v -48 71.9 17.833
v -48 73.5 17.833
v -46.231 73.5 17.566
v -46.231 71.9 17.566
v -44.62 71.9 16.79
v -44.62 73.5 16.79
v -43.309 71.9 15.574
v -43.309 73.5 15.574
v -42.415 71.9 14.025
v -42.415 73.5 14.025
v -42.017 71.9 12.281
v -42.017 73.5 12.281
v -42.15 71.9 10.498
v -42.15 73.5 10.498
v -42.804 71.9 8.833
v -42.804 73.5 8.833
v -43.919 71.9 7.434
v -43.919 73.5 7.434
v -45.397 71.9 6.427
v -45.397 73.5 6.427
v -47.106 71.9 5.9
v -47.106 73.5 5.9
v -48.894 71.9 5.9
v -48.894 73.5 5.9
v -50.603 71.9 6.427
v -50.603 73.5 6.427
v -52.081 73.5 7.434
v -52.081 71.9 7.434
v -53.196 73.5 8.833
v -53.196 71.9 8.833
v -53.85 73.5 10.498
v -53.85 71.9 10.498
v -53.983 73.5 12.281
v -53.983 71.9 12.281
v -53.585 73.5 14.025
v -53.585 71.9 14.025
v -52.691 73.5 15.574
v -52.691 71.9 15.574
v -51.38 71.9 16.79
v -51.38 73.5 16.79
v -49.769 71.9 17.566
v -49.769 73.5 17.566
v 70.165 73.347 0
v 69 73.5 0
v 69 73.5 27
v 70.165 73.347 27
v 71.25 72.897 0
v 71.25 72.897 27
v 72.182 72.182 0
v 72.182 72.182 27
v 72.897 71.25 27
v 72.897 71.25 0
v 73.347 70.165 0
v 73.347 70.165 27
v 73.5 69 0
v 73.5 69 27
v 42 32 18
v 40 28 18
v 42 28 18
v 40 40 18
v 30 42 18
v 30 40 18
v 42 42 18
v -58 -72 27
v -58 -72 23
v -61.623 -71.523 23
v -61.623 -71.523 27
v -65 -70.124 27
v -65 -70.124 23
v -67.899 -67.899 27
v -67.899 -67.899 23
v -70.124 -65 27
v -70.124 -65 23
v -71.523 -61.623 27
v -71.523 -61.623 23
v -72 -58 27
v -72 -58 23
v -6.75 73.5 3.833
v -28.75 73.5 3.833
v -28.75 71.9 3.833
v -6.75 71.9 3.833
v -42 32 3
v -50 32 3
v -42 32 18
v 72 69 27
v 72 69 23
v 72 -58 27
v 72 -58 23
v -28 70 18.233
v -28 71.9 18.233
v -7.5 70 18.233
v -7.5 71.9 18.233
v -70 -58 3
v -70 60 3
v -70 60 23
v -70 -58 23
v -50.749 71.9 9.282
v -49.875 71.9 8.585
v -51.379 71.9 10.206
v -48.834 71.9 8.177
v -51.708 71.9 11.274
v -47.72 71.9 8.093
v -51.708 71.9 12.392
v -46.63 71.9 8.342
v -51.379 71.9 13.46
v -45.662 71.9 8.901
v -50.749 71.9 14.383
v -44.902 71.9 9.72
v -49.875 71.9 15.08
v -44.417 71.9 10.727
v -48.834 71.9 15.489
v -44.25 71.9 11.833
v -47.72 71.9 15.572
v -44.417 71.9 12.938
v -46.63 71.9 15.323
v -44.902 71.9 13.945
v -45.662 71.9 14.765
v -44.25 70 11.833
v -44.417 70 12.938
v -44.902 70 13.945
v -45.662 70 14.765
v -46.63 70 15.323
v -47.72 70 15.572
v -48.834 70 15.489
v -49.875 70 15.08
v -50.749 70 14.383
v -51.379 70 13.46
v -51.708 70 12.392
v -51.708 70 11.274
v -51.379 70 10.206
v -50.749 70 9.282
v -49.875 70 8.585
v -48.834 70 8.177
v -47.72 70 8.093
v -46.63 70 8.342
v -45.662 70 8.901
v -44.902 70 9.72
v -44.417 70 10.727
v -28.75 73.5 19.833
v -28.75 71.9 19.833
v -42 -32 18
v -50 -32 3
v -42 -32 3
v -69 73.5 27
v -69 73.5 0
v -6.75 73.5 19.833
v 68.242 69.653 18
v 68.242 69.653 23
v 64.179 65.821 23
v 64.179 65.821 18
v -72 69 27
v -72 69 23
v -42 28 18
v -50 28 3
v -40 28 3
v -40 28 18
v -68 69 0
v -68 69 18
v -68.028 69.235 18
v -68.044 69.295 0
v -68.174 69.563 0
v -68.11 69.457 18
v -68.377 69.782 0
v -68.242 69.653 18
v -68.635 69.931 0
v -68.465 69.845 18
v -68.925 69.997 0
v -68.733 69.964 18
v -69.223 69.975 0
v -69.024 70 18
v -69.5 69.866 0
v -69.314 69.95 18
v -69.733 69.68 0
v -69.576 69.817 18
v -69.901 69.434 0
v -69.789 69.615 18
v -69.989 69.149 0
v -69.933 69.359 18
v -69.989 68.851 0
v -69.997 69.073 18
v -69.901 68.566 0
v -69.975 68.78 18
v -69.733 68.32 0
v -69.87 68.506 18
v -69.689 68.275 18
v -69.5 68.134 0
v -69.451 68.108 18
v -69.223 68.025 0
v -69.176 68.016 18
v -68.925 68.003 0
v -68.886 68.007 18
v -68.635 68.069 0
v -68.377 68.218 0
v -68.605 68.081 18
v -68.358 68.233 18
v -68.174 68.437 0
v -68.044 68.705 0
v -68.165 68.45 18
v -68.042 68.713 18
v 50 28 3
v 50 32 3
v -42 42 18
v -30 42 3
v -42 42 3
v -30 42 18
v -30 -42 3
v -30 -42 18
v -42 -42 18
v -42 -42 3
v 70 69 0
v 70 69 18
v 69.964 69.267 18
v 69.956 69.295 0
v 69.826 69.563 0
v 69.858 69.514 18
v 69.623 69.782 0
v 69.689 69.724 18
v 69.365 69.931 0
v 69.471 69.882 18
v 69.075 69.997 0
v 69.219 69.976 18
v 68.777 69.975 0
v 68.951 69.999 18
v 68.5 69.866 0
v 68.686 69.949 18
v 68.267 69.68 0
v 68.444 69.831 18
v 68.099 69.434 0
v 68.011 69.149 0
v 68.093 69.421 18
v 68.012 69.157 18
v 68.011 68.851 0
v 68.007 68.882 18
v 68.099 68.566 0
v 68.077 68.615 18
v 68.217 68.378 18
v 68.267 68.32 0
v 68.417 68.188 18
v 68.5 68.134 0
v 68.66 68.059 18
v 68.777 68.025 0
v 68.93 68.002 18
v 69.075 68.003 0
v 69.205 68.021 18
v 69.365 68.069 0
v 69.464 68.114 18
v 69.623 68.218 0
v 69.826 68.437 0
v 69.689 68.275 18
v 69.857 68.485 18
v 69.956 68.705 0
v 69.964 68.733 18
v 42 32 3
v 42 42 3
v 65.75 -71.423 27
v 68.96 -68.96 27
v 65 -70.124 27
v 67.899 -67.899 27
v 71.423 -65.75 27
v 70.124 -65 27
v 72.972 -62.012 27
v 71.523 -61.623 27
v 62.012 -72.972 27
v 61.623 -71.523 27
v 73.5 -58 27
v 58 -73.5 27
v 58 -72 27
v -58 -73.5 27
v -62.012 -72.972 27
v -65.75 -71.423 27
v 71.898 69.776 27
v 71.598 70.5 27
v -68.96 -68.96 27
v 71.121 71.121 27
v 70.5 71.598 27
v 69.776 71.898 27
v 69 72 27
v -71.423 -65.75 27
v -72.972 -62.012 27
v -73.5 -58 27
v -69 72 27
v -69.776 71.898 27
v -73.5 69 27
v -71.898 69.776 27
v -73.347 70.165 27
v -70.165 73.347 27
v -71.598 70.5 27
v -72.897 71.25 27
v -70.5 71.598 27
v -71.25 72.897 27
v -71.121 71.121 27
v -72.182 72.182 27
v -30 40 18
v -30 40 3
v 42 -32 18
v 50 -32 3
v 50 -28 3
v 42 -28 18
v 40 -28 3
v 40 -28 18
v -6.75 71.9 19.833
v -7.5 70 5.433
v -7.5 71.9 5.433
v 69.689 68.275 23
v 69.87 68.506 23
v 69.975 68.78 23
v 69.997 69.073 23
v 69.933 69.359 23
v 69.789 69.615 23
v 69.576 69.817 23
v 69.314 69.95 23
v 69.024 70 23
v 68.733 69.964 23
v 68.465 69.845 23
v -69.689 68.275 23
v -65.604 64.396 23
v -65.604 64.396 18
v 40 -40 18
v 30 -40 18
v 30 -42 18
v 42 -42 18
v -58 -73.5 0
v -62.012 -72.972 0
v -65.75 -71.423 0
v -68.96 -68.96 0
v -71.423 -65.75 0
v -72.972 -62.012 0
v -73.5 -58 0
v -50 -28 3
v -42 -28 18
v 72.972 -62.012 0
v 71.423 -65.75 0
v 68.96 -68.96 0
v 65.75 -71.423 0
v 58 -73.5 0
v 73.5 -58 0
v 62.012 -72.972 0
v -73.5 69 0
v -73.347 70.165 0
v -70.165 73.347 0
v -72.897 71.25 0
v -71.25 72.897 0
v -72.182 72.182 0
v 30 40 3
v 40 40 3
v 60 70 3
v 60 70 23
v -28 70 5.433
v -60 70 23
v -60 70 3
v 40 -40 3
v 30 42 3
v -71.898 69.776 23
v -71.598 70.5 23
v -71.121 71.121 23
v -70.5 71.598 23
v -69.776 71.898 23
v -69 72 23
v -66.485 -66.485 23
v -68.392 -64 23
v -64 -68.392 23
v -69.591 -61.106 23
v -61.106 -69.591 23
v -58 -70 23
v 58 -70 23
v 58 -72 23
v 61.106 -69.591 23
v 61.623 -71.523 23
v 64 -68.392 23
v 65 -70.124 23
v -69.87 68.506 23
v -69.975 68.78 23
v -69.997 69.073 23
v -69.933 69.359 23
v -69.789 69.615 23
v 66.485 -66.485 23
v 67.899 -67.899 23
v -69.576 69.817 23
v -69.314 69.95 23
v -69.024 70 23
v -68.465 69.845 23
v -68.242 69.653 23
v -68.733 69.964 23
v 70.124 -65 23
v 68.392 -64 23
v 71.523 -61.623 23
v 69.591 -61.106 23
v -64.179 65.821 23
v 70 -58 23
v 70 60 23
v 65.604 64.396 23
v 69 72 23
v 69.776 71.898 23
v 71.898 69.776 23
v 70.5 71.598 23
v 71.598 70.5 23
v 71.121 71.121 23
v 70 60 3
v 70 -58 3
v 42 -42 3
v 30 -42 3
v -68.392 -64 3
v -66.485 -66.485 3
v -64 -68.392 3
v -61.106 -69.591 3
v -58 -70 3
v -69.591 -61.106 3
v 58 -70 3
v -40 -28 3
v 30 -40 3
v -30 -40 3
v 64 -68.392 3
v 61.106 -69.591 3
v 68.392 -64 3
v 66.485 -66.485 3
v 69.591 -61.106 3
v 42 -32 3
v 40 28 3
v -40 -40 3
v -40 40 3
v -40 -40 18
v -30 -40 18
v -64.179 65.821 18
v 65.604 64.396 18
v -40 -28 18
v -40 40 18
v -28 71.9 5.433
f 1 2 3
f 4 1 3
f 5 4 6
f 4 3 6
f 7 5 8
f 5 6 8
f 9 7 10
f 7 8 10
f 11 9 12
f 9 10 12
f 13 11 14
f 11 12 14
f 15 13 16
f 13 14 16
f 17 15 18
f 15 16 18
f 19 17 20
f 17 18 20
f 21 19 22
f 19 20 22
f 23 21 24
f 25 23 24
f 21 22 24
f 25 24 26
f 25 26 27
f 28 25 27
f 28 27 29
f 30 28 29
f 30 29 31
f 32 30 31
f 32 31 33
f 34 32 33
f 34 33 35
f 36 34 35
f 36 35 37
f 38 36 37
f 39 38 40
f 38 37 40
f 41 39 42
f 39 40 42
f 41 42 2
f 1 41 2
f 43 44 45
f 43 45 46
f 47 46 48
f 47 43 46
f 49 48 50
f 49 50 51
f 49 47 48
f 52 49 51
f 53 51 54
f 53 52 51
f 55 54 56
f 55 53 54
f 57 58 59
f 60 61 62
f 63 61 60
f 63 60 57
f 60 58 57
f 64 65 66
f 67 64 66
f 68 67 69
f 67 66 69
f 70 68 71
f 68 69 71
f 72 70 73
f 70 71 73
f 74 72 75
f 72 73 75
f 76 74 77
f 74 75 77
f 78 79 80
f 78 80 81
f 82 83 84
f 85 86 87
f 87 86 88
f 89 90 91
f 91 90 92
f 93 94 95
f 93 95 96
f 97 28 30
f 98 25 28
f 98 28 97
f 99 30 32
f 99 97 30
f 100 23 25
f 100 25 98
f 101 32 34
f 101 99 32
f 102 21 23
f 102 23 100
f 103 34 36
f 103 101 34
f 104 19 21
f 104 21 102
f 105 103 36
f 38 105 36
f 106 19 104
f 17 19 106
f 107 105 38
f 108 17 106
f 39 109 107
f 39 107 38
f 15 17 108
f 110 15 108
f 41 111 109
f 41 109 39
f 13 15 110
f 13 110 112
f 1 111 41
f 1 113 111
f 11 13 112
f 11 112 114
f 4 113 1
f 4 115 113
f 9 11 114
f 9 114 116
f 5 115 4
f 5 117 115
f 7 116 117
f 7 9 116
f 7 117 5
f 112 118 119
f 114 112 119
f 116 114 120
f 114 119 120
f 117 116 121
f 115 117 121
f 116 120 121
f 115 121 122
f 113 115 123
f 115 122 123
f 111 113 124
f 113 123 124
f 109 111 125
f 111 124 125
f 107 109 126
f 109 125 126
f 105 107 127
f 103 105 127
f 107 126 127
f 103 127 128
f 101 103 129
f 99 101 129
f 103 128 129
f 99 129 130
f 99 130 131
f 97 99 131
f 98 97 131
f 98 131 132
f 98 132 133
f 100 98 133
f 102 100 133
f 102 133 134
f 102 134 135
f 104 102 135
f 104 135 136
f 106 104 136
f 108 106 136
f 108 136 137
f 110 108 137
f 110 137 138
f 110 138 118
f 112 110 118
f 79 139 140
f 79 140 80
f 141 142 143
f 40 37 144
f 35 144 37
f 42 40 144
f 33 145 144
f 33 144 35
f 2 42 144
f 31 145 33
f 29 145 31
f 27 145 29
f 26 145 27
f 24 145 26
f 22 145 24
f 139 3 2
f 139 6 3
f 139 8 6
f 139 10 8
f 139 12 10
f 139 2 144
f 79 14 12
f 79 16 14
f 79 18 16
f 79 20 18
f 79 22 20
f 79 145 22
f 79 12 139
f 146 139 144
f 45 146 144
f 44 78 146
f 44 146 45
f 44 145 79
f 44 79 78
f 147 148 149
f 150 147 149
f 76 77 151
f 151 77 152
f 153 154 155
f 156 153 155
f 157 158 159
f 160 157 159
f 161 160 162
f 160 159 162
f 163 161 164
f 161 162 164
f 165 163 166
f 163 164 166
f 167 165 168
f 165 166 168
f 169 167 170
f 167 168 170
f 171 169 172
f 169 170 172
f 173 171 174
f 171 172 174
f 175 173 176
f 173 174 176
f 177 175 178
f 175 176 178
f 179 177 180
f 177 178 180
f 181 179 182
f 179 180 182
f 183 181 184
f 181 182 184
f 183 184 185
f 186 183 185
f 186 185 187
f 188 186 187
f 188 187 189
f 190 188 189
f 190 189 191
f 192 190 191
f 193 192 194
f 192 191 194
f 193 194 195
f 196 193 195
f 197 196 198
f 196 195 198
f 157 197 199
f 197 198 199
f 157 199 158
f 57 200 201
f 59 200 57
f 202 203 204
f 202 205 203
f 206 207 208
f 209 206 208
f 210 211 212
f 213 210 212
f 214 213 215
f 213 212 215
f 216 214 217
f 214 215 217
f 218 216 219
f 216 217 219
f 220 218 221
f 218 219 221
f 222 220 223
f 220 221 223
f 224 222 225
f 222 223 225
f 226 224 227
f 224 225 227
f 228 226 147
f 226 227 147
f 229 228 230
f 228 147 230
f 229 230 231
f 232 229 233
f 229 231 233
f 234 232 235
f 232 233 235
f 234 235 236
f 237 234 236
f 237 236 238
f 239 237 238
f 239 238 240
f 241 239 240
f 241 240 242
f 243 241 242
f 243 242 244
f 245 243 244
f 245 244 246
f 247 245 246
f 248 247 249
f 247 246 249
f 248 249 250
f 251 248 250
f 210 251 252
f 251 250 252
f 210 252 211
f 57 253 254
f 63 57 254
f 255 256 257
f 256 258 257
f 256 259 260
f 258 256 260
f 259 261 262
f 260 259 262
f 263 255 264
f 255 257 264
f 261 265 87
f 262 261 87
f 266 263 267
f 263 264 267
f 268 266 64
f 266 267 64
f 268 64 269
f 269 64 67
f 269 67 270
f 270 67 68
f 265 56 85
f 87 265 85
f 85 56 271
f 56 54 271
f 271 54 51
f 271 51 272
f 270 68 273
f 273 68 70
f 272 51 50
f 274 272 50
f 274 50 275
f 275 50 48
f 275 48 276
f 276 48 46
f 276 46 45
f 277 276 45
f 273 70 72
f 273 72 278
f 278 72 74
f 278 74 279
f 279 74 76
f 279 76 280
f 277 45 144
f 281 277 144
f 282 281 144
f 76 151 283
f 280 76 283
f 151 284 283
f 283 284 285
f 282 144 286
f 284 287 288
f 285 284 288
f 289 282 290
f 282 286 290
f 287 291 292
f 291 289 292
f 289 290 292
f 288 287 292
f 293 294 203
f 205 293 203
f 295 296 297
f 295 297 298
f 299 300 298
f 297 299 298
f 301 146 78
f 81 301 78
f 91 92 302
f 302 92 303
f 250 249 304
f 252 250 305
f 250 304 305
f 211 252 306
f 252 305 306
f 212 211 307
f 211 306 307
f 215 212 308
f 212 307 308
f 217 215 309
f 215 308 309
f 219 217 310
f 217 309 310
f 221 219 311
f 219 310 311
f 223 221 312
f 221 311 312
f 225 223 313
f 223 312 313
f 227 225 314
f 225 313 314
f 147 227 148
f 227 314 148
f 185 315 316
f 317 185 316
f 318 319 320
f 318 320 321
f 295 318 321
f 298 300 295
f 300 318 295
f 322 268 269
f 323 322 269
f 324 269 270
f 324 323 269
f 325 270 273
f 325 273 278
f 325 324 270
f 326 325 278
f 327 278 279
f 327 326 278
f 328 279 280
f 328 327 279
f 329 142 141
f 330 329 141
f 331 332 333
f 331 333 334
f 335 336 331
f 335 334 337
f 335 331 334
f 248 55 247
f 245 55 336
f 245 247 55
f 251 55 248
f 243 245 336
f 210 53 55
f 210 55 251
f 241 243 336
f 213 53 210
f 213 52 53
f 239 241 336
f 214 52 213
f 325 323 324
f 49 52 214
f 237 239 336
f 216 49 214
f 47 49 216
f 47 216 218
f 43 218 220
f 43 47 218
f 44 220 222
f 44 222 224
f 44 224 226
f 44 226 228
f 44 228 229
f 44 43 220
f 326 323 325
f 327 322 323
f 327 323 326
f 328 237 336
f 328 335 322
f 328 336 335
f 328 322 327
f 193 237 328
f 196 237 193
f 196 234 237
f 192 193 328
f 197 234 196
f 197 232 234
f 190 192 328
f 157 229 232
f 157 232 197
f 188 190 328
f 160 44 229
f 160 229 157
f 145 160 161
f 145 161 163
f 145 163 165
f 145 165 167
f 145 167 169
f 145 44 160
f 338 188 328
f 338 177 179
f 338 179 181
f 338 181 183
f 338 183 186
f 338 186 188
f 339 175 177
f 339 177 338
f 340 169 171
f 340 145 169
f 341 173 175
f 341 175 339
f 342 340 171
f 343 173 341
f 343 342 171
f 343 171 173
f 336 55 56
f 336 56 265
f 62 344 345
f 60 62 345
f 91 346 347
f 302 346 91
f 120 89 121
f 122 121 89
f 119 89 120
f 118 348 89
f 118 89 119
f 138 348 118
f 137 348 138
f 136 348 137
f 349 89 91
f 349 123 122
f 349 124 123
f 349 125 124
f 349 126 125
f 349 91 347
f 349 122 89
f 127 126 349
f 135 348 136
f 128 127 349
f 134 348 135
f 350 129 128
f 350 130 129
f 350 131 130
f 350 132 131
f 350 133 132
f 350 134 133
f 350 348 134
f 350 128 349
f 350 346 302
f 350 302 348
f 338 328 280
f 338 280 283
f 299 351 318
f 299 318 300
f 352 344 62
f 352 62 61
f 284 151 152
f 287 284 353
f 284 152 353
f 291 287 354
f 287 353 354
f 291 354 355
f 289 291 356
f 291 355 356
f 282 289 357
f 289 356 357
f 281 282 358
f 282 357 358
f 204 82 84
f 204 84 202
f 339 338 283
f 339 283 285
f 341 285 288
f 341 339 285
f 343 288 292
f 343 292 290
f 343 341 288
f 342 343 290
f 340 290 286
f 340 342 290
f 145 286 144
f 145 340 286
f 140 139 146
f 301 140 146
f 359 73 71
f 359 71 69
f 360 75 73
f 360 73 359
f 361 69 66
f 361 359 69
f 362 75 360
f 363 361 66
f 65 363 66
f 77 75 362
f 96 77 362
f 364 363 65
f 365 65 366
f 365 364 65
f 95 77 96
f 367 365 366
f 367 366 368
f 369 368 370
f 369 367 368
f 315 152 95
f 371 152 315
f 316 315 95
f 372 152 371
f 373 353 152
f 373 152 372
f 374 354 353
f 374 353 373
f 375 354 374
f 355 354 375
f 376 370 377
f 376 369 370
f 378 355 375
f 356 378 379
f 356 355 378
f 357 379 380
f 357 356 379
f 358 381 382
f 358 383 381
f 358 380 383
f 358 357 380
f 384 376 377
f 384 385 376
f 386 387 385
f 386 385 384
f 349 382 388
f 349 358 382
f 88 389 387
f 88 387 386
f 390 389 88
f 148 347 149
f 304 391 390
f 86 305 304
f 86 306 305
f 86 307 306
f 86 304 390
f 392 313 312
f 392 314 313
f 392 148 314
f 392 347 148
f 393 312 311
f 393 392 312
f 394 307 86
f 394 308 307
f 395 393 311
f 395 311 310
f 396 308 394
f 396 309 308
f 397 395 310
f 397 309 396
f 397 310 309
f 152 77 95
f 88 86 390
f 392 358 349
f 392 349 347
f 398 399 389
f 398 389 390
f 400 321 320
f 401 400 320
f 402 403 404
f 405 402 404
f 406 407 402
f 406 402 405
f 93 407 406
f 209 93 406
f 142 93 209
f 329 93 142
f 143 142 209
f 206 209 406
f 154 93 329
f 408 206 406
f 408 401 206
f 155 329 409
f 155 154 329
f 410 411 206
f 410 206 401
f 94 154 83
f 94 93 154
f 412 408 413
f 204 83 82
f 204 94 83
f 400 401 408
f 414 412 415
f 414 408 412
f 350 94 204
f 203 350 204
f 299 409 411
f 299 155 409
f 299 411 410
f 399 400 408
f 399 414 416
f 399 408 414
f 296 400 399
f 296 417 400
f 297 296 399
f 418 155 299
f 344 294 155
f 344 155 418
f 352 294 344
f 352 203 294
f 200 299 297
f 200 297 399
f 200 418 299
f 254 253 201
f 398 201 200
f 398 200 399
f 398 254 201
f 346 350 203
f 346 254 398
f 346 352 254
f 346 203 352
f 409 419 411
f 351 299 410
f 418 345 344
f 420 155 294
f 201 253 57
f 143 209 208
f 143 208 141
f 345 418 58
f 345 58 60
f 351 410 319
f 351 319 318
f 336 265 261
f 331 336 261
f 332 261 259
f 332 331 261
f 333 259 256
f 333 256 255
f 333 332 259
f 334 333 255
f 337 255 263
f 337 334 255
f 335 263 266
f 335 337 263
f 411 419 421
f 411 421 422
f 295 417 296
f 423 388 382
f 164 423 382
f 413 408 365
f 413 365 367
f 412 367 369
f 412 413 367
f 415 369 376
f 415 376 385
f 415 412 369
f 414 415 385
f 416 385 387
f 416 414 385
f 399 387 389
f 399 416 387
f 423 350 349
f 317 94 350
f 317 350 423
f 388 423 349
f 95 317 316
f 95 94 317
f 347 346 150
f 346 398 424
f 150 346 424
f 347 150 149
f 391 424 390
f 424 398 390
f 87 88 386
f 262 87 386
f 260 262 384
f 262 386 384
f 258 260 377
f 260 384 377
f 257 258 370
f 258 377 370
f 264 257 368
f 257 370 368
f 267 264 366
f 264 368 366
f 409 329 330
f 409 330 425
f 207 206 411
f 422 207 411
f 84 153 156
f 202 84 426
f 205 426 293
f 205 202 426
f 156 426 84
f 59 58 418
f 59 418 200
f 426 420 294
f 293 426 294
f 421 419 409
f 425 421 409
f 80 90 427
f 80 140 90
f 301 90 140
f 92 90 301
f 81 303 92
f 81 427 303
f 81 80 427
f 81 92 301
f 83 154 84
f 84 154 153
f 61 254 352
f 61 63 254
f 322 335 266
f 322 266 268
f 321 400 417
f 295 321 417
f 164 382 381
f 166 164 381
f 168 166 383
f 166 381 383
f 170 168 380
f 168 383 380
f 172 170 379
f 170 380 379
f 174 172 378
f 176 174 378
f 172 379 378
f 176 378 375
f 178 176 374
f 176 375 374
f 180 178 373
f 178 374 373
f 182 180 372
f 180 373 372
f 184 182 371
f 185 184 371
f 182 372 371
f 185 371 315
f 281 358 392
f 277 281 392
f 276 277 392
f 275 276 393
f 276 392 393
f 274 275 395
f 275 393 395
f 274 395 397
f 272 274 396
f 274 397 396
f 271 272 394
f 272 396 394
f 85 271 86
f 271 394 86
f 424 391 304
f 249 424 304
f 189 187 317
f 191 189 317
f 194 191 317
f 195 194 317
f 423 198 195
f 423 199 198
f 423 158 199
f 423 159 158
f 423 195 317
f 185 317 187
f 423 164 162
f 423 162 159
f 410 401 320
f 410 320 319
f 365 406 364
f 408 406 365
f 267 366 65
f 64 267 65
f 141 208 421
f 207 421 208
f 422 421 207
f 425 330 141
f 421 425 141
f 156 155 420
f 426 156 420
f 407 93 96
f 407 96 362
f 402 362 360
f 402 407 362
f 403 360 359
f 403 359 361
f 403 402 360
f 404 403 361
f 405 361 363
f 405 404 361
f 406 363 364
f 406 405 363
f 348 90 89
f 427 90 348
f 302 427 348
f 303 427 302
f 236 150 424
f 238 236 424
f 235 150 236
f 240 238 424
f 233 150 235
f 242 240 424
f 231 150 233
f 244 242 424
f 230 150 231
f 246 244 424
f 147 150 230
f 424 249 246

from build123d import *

# Parameters (mm, degrees)
BOSS_EXTRUDE1_DEPTH = 3
BOSS_EXTRUDE2_DEPTH = 20
CHAMFER1_SIZE       = 10
SKETCH3_W           = 84
SKETCH3_H           = 84
SKETCH3_W_2         = 80
SKETCH3_H_2         = 80
BOSS_EXTRUDE3_DEPTH = 15
BOSS_EXTRUDE4_DEPTH = 84
SKETCH7_W           = 8
SKETCH7_H           = 10
SKETCH7_H_2         = 56
SKETCH7_W_2         = 60
SKETCH7_H_3         = 84
CUT_EXTRUDE1_DEPTH  = 72
FILLET1_R           = 3
BOSS_EXTRUDE5_DEPTH = 27
SKETCH10_R          = 3.75
CUT_EXTRUDE2_DEPTH  = 26
CUT_EXTRUDE3_DEPTH  = 5
SKETCH12_R          = 1
CUT_EXTRUDE4_DEPTH  = 33
SKETCH14_R          = 6
CUT_EXTRUDE5_DEPTH  = 1.6
SKETCH15_W          = 20.5
SKETCH15_H          = 12.8
CUT_EXTRUDE6_DEPTH  = 9.6
SKETCH16_W          = 22
SKETCH16_H          = 16
CUT_EXTRUDE7_DEPTH  = 1.6
SKETCH18_W          = 84
SKETCH18_H          = 56
CUT_EXTRUDE8_DEPTH  = 15


with BuildPart() as part:
    # Sketch1 → Boss-Extrude1 (new body)
    with BuildSketch(Plane.XY):
        with BuildLine():
            Line((58, -72), (-58, -72))
            ThreePointArc((-58, -72), (-67.899494937, -67.899494937), (-72, -58))
            Line((-72, -58), (-72, 72))
            Line((-72, 72), (72, 72))
            Line((72, 72), (72, -58))
            ThreePointArc((72, -58), (67.899494937, -67.899494937), (58, -72))
        make_face()
    extrude(amount=BOSS_EXTRUDE1_DEPTH)

    # Sketch2 → Boss-Extrude2 (add)
    with BuildSketch(Plane.XY.offset(3)):
        with BuildLine():
            Line((-72, 72), (-72, -58))
            ThreePointArc((-72, -58), (-67.899494937, -67.899494937), (-58, -72))
            Line((-58, -72), (58, -72))
            ThreePointArc((58, -72), (67.899494937, -67.899494937), (72, -58))
            Line((72, -58), (72, 72))
            Line((72, 72), (-72, 72))
        make_face()
        with BuildLine():
            Line((-70, 70), (-70, -58))
            ThreePointArc((-70, -58), (-66.485281374, -66.485281374), (-58, -70))
            Line((-58, -70), (58, -70))
            ThreePointArc((58, -70), (66.485281374, -66.485281374), (70, -58))
            Line((70, -58), (70, 70))
            Line((70, 70), (-70, 70))
        make_face(mode=Mode.SUBTRACT)
    extrude(amount=BOSS_EXTRUDE2_DEPTH)

    # Chamfer1
    chamfer1_edges = [part.edges().sort_by_distance(p)[0] for p in [
        (-70, 70, 13),
        (70, 70, 13),
    ]]
    chamfer(chamfer1_edges, length=CHAMFER1_SIZE)

    # Sketch3 → Boss-Extrude3 (add)
    with BuildSketch(Plane.XY.offset(3)):
        Rectangle(SKETCH3_W, SKETCH3_H)
        Rectangle(SKETCH3_W_2, SKETCH3_H_2, mode=Mode.SUBTRACT)
    extrude(amount=BOSS_EXTRUDE3_DEPTH)

    # Sketch6 → Boss-Extrude4 (add)
    with BuildSketch(Plane.XZ.offset(42)):
        Polygon((-42, 3), (-50, 3), (-42, 18), align=None)
        Polygon((42, 18), (42, 3), (50, 3), align=None)
    extrude(amount=-BOSS_EXTRUDE4_DEPTH)

    # Sketch7 → Cut-Extrude1 (cut)
    with BuildSketch(Plane.XY.offset(3)):
        with Locations((-46, 37)):
            Rectangle(SKETCH7_W, SKETCH7_H)
        with Locations((-46, 0)):
            Rectangle(SKETCH7_W, SKETCH7_H_2)
        with Locations((-46, -37)):
            Rectangle(SKETCH7_W, SKETCH7_H)
        with Locations((46, -37)):
            Rectangle(SKETCH7_W, SKETCH7_H)
        with Locations((46, 0)):
            Rectangle(SKETCH7_W, SKETCH7_H_2)
        with Locations((46, 37)):
            Rectangle(SKETCH7_W, SKETCH7_H)
        Rectangle(SKETCH7_W_2, SKETCH7_H_3)
    extrude(amount=CUT_EXTRUDE1_DEPTH, mode=Mode.SUBTRACT)

    # Fillet1
    fillet1_edges = [part.edges().sort_by_distance(p)[0] for p in [
        (-72, 72, 11.5),
        (72, 72, 11.5),
    ]]
    fillet(fillet1_edges, radius=FILLET1_R)

    # Sketch9 → Boss-Extrude5 (add)
    with BuildSketch(Plane(origin=(0, 0, 0), x_dir=(-1, 0, 0), z_dir=(0, 0, -1))):
        with BuildLine():
            Line((73.5, -58), (73.5, 69))
            ThreePointArc((73.5, 69), (72.181980515, 72.181980515), (69, 73.5))
            Line((69, 73.5), (-69, 73.5))
            ThreePointArc((-69, 73.5), (-72.181980515, 72.181980515), (-73.5, 69))
            Line((-73.5, 69), (-73.5, -58))
            ThreePointArc((-73.5, -58), (-68.960155108, -68.960155108), (-58, -73.5))
            Line((-58, -73.5), (58, -73.5))
            ThreePointArc((58, -73.5), (68.960155108, -68.960155108), (73.5, -58))
        make_face()
        with BuildLine():
            Line((72, -58), (72, 69))
            ThreePointArc((72, 69), (71.121320344, 71.121320344), (69, 72))
            Line((69, 72), (-69, 72))
            ThreePointArc((-69, 72), (-71.121320344, 71.121320344), (-72, 69))
            Line((-72, 69), (-72, -58))
            ThreePointArc((-72, -58), (-67.899494937, -67.899494937), (-58, -72))
            Line((-58, -72), (58, -72))
            ThreePointArc((58, -72), (67.899494937, -67.899494937), (72, -58))
        make_face(mode=Mode.SUBTRACT)
    extrude(amount=-BOSS_EXTRUDE5_DEPTH)

    # Sketch10 → Cut-Extrude2 (cut)
    with BuildSketch(Plane.XZ.offset(-70)):
        with Locations((-48, 11.832723103)):
            Circle(SKETCH10_R)
    extrude(amount=-CUT_EXTRUDE2_DEPTH, mode=Mode.SUBTRACT)

    # Sketch11 → Cut-Extrude3 (cut)
    with BuildSketch(Plane.XY.offset(23)):
        with BuildLine():
            Line((-69.688606392, 68.274864677), (-65.603988879, 64.396011121))
            Line((-65.603988879, 64.396011121), (-64.178908017, 65.821091983))
            Line((-64.178908017, 65.821091983), (-68.242386769, 69.652703755))
            ThreePointArc((-68.242386769, 69.652703755), (-69.689783022, 69.724016148), (-69.688606392, 68.274864677))
        make_face()
        with BuildLine():
            Line((64.178908017, 65.821091983), (65.603988879, 64.396011121))
            Line((65.603988879, 64.396011121), (69.688606392, 68.274864677))
            ThreePointArc((69.688606392, 68.274864677), (69.689783022, 69.724016148), (68.242386769, 69.652703755))
            Line((68.242386769, 69.652703755), (64.178908017, 65.821091983))
        make_face()
    extrude(amount=-CUT_EXTRUDE3_DEPTH, mode=Mode.SUBTRACT)

    # Sketch12 → Cut-Extrude4 (cut)
    with BuildSketch(Plane.XY.offset(18)):
        with Locations((-69, 69)):
            Circle(SKETCH12_R)
        with Locations((69, 69)):
            Circle(SKETCH12_R)
    extrude(amount=-CUT_EXTRUDE4_DEPTH, mode=Mode.SUBTRACT)

    # Sketch14 → Cut-Extrude5 (cut)
    with BuildSketch(Plane(origin=(0, 73.5, 0), x_dir=(1, 0, 0), z_dir=(0, 1, 0))):
        with Locations(Location((-48, -11.832723103, 0), (0, 0, 270))):
            Circle(SKETCH14_R)
    extrude(amount=-CUT_EXTRUDE5_DEPTH, mode=Mode.SUBTRACT)

    # Sketch15 → Cut-Extrude6 (cut)
    with BuildSketch(Plane(origin=(0, 73.5, 0), x_dir=(1, 0, 0), z_dir=(0, 1, 0))):
        with Locations((-17.75, -11.832723103)):
            Rectangle(SKETCH15_W, SKETCH15_H)
    extrude(amount=-CUT_EXTRUDE6_DEPTH, mode=Mode.SUBTRACT)

    # Sketch16 → Cut-Extrude7 (cut)
    with BuildSketch(Plane(origin=(0, 73.5, 0), x_dir=(1, 0, 0), z_dir=(0, 1, 0))):
        with Locations((-17.75, -11.832723103)):
            Rectangle(SKETCH16_W, SKETCH16_H)
    extrude(amount=-CUT_EXTRUDE7_DEPTH, mode=Mode.SUBTRACT)

    # Sketch18 → Cut-Extrude8 (cut)
    with BuildSketch(Plane.XY.offset(18)):
        Rectangle(SKETCH18_W, SKETCH18_H)
    extrude(amount=-CUT_EXTRUDE8_DEPTH, mode=Mode.SUBTRACT)


solid = part.part
